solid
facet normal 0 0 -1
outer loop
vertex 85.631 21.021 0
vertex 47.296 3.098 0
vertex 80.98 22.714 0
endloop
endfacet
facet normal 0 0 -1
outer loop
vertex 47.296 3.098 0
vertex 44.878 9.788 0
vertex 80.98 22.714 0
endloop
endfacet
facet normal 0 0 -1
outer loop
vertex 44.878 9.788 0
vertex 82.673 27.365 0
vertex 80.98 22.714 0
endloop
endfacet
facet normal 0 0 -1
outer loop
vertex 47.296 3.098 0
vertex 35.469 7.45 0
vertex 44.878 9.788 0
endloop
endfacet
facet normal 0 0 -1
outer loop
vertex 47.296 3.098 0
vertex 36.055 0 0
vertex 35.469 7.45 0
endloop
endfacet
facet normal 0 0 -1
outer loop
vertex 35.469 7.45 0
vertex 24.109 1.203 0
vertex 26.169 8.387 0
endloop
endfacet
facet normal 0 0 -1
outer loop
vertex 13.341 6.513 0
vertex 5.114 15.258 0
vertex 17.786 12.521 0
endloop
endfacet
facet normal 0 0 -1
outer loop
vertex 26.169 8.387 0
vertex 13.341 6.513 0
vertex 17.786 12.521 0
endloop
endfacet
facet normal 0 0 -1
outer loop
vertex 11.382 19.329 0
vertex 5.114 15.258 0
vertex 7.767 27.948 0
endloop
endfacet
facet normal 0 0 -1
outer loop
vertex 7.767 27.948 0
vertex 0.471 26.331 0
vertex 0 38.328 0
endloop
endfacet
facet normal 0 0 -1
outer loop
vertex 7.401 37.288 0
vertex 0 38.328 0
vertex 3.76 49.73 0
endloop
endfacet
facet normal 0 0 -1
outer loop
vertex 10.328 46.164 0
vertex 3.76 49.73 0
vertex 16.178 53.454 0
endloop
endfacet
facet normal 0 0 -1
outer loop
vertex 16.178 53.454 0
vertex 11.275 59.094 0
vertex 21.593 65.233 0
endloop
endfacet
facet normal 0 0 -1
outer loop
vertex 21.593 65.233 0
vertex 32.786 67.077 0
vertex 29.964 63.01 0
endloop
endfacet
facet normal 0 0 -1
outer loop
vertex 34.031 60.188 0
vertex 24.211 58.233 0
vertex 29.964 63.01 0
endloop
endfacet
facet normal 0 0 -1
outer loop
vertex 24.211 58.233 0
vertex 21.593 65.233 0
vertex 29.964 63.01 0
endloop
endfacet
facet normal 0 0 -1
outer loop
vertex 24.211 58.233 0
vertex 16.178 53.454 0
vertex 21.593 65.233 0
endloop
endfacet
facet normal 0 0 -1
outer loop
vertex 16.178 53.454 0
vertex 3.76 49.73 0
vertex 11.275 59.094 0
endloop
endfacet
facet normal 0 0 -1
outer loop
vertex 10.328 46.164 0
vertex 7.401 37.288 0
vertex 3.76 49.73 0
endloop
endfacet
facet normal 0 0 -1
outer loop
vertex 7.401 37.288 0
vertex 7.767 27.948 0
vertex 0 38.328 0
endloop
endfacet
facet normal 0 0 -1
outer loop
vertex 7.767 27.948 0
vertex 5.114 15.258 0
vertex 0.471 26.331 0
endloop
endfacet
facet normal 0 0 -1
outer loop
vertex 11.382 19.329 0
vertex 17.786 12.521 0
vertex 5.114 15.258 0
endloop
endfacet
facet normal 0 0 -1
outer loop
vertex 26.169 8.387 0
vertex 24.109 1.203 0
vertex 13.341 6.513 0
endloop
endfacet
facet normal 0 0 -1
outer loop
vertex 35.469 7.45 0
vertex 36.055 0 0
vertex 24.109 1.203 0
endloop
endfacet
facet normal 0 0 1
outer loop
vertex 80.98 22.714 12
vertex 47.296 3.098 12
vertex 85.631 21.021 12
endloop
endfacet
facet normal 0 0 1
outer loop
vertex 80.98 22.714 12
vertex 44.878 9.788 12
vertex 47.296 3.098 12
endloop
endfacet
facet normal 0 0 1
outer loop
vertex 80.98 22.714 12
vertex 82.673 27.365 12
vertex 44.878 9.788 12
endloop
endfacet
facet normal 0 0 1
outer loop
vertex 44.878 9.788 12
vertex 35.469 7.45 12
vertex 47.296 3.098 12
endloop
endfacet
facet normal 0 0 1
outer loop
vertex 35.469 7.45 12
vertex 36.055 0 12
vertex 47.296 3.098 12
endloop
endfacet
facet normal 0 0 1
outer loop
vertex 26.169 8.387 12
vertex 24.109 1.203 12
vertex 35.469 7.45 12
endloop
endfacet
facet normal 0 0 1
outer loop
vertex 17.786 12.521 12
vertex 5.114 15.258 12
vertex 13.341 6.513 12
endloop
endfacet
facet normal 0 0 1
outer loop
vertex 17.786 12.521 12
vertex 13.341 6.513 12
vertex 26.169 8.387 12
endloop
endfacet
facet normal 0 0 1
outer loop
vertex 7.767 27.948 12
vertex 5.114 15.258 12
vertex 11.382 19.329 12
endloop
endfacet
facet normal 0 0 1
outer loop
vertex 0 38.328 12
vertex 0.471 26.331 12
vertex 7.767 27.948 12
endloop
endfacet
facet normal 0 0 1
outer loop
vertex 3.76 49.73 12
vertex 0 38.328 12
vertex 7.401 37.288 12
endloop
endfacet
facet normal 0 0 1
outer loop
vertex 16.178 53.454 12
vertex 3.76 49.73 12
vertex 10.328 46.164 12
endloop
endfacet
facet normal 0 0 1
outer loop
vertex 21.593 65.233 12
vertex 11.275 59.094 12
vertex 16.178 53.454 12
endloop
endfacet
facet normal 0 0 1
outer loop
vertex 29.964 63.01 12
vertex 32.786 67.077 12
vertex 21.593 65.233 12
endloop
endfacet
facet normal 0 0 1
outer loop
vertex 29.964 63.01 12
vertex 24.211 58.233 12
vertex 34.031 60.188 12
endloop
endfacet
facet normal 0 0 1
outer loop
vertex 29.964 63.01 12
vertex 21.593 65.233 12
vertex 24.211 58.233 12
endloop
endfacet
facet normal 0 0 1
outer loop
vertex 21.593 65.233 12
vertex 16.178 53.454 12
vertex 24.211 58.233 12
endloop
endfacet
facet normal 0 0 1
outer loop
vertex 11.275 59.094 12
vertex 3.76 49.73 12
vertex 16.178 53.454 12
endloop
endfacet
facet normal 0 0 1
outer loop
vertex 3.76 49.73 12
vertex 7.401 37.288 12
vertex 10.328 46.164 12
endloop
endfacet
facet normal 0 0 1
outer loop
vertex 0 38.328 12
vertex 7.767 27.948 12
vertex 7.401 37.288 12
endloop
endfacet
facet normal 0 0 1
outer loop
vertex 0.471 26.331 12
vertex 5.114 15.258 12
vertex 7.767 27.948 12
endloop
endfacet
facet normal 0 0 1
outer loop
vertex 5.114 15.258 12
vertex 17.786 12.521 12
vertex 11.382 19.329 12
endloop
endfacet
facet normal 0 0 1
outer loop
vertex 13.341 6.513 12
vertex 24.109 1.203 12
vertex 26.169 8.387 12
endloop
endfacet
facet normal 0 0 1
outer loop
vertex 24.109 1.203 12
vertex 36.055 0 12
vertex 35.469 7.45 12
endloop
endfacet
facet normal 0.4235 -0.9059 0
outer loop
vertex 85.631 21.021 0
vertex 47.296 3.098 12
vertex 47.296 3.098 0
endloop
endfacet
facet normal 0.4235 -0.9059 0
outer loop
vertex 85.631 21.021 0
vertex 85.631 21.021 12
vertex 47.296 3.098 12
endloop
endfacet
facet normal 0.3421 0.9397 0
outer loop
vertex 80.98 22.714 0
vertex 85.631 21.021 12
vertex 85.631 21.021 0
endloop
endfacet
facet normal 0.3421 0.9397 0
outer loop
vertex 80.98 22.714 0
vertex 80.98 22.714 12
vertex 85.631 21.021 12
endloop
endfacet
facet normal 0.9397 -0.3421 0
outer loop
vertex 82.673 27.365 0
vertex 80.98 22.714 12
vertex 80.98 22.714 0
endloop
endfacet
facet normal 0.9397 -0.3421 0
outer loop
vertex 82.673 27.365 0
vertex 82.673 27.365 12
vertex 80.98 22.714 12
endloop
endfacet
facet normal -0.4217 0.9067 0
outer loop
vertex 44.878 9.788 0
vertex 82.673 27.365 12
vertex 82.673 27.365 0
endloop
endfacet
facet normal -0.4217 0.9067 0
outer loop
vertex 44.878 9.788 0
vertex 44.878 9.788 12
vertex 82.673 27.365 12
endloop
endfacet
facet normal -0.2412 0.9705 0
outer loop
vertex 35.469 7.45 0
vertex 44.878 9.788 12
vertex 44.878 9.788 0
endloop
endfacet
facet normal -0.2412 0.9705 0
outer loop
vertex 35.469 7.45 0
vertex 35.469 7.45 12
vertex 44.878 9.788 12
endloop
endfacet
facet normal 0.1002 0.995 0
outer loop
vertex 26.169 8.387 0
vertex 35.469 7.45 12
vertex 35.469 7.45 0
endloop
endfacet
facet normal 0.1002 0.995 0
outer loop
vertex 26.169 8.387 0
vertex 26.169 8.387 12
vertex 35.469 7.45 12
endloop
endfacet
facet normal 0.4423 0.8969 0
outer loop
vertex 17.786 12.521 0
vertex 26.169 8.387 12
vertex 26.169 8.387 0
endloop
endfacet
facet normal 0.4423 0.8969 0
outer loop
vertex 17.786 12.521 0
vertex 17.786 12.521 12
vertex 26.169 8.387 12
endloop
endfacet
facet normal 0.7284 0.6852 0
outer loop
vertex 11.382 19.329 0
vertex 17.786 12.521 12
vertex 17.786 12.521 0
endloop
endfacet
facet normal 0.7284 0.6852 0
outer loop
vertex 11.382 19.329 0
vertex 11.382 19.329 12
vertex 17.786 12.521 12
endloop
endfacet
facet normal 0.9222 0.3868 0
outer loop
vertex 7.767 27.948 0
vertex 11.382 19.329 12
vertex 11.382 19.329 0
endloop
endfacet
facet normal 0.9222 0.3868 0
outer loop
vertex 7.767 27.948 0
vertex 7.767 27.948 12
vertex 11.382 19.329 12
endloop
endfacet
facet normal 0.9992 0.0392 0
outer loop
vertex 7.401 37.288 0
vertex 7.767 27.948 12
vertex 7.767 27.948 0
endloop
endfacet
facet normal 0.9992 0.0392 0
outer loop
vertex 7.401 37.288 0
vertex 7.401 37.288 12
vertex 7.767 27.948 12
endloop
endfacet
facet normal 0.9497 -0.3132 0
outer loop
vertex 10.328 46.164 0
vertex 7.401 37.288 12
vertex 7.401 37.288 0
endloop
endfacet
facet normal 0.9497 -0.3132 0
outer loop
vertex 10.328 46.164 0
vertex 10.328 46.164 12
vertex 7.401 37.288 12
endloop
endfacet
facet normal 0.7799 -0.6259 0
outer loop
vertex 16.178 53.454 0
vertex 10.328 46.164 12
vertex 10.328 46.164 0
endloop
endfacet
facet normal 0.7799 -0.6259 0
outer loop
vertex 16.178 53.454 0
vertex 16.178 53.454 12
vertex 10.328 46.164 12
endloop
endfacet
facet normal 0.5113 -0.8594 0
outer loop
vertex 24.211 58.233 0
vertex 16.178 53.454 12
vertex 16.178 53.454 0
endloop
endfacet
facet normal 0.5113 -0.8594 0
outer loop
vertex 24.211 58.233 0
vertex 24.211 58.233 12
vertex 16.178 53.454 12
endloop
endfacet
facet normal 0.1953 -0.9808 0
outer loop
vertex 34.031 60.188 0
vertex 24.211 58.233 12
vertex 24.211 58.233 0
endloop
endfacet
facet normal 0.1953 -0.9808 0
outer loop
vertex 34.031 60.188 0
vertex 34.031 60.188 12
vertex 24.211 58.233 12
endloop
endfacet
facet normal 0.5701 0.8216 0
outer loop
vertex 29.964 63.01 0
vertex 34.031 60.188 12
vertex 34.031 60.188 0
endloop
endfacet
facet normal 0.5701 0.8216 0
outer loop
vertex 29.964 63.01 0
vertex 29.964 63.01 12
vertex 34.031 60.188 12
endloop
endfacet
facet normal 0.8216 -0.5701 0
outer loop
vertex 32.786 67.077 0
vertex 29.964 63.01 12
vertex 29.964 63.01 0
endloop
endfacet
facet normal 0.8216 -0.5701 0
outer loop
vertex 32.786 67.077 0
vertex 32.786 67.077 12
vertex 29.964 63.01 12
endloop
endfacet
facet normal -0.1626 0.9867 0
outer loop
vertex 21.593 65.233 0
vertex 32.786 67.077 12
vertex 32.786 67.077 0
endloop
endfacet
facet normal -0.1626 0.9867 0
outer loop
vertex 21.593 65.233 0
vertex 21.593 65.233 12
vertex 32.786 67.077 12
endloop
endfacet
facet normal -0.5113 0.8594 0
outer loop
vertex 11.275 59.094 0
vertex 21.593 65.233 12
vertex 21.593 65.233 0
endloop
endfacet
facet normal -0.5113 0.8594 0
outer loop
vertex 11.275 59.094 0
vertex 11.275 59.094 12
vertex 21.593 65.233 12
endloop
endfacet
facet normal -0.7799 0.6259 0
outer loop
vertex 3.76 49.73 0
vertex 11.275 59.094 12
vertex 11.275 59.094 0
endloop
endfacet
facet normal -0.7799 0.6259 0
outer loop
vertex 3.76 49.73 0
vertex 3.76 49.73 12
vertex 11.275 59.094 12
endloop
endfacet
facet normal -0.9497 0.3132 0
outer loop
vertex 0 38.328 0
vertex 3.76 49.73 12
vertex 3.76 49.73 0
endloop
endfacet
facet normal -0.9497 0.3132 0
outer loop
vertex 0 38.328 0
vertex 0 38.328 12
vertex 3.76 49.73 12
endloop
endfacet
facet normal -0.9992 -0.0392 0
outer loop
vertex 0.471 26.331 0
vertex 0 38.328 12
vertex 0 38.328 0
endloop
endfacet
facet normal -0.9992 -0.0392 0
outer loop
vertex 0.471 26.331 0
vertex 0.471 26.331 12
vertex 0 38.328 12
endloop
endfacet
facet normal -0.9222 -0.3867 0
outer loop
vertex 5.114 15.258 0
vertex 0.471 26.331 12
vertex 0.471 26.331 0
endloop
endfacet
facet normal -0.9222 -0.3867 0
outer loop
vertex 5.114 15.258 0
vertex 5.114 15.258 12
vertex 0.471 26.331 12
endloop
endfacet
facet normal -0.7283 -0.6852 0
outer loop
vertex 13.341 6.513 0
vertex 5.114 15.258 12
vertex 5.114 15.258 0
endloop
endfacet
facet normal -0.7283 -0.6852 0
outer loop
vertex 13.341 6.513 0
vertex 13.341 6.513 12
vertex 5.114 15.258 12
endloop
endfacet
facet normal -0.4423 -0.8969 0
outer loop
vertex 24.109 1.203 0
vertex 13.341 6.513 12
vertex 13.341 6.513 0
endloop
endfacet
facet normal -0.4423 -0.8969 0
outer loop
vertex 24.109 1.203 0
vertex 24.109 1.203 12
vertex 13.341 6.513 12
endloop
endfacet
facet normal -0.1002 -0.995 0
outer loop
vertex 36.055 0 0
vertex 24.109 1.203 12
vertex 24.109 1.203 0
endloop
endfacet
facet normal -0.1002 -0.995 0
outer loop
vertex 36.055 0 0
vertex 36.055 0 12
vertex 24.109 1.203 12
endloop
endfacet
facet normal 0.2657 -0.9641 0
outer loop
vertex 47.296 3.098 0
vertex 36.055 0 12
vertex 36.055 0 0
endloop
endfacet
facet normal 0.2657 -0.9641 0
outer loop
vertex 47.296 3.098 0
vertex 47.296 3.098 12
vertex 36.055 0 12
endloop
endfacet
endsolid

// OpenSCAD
$fn = 32;

// ----------------------------------------------------------------------
// Hook plate: curl radius 30 mm over 205 degrees, 7 mm thick band
// ----------------------------------------------------------------------

// --- parameters (mm) ---
profile_height = 12;      // extrusion height
profile_points = 26;      // points of the closed outline

profile = [[29.964, 63.01], [32.786, 67.077], [21.593, 65.233], [11.275, 59.094], [3.76, 49.73], [0, 38.328], [0.471, 26.331], [5.114, 15.258], [13.341, 6.513], [24.109, 1.203], [36.055, 0], [47.296, 3.098], [85.631, 21.021], [80.98, 22.714], [82.673, 27.365], [44.878, 9.788], [35.469, 7.45], [26.169, 8.387], [17.786, 12.521], [11.382, 19.329], [7.767, 27.948], [7.401, 37.288], [10.328, 46.164], [16.178, 53.454], [24.211, 58.233], [34.031, 60.188]];  // single closed polygon, 26 points, counter clockwise

// --- the one profile operation ---
linear_extrude(height = profile_height) polygon(points = profile);
